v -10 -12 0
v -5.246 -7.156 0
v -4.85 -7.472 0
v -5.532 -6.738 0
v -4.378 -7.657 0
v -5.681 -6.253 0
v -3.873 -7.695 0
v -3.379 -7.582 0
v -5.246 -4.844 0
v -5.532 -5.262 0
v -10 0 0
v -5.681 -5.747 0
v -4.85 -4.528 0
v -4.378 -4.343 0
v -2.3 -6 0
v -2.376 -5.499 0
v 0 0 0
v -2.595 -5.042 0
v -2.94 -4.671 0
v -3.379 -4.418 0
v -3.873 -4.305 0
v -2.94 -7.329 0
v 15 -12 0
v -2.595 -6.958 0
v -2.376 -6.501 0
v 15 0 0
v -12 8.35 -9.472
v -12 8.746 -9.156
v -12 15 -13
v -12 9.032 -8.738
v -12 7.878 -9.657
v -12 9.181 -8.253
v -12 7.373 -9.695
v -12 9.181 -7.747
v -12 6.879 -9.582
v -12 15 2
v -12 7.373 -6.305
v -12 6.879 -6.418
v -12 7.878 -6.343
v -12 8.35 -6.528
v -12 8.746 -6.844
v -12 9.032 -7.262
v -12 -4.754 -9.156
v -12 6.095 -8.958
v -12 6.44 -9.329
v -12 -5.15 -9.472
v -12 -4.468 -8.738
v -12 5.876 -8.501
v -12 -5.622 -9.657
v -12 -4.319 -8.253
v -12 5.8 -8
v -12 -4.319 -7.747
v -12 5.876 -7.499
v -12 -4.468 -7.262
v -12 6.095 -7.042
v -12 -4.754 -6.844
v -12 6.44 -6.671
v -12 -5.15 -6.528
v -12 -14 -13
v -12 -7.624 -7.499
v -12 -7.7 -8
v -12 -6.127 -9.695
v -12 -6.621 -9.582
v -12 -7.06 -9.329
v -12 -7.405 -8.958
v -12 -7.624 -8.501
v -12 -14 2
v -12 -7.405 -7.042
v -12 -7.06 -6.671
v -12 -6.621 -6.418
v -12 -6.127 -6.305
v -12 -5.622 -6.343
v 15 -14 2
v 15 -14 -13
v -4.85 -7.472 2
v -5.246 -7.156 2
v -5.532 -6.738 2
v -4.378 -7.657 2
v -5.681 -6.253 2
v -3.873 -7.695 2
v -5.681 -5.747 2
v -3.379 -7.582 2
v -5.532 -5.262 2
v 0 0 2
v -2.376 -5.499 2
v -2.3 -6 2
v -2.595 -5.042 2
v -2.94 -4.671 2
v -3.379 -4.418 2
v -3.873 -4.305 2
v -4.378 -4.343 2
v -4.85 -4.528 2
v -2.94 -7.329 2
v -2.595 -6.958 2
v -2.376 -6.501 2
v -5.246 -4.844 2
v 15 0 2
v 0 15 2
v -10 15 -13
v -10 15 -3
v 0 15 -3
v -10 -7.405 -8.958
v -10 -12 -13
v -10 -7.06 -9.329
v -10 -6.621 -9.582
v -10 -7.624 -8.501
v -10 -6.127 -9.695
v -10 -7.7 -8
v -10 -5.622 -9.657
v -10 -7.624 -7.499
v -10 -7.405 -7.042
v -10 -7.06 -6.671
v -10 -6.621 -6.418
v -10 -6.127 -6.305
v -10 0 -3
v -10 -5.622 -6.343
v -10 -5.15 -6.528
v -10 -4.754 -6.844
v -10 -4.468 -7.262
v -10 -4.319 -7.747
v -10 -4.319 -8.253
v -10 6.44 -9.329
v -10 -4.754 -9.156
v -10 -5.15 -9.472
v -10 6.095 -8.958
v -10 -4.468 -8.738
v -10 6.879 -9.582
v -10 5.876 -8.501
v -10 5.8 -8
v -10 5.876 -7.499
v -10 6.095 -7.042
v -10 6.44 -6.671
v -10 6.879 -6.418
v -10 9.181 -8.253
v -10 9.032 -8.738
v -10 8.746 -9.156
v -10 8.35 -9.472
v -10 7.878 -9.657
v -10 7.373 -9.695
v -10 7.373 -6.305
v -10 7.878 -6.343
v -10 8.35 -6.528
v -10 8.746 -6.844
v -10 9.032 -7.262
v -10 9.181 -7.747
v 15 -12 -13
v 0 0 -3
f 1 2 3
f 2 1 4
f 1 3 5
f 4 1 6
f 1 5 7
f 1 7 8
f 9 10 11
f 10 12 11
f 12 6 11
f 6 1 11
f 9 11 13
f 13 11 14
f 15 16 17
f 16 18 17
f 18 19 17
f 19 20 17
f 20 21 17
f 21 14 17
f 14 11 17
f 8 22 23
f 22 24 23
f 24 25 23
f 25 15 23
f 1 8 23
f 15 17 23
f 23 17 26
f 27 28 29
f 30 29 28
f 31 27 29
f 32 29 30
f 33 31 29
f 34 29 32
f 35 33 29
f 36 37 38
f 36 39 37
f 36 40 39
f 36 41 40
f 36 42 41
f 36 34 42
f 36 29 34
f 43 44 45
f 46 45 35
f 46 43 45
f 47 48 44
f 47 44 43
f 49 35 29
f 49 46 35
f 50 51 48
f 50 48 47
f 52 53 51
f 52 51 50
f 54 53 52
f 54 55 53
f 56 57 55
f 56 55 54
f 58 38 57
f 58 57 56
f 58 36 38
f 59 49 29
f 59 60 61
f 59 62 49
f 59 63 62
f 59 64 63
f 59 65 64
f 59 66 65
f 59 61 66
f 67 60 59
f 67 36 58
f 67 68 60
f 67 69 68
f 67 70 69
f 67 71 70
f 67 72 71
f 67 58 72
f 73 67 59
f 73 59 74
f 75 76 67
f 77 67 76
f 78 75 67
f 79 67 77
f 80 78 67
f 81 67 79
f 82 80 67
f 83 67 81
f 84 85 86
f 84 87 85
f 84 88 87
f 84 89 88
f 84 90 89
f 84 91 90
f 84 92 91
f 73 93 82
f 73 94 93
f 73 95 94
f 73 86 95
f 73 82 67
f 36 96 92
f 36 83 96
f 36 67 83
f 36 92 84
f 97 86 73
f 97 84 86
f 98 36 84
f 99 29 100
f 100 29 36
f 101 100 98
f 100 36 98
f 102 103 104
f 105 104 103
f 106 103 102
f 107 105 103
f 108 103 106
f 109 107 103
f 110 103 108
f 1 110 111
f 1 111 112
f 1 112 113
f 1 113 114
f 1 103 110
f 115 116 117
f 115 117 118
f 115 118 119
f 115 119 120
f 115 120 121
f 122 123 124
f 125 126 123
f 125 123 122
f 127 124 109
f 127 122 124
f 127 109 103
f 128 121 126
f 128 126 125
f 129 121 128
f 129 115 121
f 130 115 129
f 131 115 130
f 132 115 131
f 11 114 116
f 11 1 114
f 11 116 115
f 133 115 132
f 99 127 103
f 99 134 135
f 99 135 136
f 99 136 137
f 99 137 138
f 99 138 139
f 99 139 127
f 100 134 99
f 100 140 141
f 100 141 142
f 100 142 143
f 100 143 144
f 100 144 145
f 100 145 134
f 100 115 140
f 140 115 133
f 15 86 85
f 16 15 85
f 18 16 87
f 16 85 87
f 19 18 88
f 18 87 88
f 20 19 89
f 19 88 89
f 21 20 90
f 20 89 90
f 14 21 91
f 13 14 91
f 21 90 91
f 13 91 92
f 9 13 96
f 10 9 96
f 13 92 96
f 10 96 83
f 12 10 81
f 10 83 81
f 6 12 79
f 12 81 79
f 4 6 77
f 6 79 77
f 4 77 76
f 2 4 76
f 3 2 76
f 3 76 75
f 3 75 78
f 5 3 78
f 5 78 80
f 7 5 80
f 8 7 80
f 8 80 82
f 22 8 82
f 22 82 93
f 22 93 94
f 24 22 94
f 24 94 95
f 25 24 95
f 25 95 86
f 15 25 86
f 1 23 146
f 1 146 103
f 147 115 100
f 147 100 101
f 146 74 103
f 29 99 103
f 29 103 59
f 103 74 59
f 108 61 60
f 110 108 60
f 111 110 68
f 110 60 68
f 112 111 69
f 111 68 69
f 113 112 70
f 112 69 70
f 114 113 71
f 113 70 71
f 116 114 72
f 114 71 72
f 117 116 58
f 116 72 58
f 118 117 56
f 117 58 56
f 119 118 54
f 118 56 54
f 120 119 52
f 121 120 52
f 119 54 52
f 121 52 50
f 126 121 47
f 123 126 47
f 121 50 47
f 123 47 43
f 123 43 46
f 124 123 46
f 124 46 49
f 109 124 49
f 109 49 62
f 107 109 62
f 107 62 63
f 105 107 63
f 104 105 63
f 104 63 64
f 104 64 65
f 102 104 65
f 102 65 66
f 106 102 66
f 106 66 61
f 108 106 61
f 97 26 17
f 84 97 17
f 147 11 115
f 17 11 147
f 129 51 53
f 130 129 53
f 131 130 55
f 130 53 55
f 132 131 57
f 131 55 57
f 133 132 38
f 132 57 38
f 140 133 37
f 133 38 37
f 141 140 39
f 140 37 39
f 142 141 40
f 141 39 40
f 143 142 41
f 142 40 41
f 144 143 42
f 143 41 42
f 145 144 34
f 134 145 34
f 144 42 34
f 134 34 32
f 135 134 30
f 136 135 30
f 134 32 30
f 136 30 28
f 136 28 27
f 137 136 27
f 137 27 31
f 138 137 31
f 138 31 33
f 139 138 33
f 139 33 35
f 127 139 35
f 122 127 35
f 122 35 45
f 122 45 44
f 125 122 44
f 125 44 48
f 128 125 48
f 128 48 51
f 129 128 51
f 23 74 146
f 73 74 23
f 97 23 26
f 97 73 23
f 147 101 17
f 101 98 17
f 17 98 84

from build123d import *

# Parameters (mm, degrees)
PAD_DEPTH       = 2
PAD001_DEPTH    = 13
SKETCH002_W     = 10
SKETCH002_H     = 15
PAD002_DEPTH    = 3
SKETCH003_R     = 1.7
POCKET_DEPTH    = 27.001
SKETCH004_R     = 1.7
POCKET001_DEPTH = 15.001


with BuildPart() as part:
    # Sketch → Pad (new body)
    with BuildSketch(Plane.XY):
        Polygon((-12, 15), (-12, -14), (15, -14), (15, 0), (0, 0), (0, 15), align=None)
    extrude(amount=PAD_DEPTH)

    # Sketch001 → Pad001 (new body)
    with BuildSketch(Plane(origin=(0, 0, 0), x_dir=(1, 0, 0), z_dir=(0, 0, -1))):
        Polygon((-12, -15), (-12, 14), (15, 14), (15, 12), (-10, 12), (-10, -15), align=None)
    extrude(amount=PAD001_DEPTH)

    # Sketch002 → Pad002 (new body)
    with BuildSketch(Plane(origin=(0, 0, 0), x_dir=(1, 0, 0), z_dir=(0, 0, -1))):
        with Locations((-5, -7.5)):
            Rectangle(SKETCH002_W, SKETCH002_H)
    extrude(amount=PAD002_DEPTH)

    # Sketch003 → Pocket (cut, through all)
    with BuildSketch(Plane(origin=(-12, 0, 0), x_dir=(0, -1, 0), z_dir=(-1, 0, 0))):
        with Locations((-7.5, -8)):
            Circle(SKETCH003_R)
        with Locations((6, -8)):
            Circle(SKETCH003_R)
    extrude(amount=-POCKET_DEPTH, mode=Mode.SUBTRACT)

    # Sketch004 → Pocket001 (cut, through all)
    with BuildSketch(Plane.XY.offset(2)):
        with Locations((-4, -6)):
            Circle(SKETCH004_R)
    extrude(amount=-POCKET001_DEPTH, mode=Mode.SUBTRACT)


solid = part.part
